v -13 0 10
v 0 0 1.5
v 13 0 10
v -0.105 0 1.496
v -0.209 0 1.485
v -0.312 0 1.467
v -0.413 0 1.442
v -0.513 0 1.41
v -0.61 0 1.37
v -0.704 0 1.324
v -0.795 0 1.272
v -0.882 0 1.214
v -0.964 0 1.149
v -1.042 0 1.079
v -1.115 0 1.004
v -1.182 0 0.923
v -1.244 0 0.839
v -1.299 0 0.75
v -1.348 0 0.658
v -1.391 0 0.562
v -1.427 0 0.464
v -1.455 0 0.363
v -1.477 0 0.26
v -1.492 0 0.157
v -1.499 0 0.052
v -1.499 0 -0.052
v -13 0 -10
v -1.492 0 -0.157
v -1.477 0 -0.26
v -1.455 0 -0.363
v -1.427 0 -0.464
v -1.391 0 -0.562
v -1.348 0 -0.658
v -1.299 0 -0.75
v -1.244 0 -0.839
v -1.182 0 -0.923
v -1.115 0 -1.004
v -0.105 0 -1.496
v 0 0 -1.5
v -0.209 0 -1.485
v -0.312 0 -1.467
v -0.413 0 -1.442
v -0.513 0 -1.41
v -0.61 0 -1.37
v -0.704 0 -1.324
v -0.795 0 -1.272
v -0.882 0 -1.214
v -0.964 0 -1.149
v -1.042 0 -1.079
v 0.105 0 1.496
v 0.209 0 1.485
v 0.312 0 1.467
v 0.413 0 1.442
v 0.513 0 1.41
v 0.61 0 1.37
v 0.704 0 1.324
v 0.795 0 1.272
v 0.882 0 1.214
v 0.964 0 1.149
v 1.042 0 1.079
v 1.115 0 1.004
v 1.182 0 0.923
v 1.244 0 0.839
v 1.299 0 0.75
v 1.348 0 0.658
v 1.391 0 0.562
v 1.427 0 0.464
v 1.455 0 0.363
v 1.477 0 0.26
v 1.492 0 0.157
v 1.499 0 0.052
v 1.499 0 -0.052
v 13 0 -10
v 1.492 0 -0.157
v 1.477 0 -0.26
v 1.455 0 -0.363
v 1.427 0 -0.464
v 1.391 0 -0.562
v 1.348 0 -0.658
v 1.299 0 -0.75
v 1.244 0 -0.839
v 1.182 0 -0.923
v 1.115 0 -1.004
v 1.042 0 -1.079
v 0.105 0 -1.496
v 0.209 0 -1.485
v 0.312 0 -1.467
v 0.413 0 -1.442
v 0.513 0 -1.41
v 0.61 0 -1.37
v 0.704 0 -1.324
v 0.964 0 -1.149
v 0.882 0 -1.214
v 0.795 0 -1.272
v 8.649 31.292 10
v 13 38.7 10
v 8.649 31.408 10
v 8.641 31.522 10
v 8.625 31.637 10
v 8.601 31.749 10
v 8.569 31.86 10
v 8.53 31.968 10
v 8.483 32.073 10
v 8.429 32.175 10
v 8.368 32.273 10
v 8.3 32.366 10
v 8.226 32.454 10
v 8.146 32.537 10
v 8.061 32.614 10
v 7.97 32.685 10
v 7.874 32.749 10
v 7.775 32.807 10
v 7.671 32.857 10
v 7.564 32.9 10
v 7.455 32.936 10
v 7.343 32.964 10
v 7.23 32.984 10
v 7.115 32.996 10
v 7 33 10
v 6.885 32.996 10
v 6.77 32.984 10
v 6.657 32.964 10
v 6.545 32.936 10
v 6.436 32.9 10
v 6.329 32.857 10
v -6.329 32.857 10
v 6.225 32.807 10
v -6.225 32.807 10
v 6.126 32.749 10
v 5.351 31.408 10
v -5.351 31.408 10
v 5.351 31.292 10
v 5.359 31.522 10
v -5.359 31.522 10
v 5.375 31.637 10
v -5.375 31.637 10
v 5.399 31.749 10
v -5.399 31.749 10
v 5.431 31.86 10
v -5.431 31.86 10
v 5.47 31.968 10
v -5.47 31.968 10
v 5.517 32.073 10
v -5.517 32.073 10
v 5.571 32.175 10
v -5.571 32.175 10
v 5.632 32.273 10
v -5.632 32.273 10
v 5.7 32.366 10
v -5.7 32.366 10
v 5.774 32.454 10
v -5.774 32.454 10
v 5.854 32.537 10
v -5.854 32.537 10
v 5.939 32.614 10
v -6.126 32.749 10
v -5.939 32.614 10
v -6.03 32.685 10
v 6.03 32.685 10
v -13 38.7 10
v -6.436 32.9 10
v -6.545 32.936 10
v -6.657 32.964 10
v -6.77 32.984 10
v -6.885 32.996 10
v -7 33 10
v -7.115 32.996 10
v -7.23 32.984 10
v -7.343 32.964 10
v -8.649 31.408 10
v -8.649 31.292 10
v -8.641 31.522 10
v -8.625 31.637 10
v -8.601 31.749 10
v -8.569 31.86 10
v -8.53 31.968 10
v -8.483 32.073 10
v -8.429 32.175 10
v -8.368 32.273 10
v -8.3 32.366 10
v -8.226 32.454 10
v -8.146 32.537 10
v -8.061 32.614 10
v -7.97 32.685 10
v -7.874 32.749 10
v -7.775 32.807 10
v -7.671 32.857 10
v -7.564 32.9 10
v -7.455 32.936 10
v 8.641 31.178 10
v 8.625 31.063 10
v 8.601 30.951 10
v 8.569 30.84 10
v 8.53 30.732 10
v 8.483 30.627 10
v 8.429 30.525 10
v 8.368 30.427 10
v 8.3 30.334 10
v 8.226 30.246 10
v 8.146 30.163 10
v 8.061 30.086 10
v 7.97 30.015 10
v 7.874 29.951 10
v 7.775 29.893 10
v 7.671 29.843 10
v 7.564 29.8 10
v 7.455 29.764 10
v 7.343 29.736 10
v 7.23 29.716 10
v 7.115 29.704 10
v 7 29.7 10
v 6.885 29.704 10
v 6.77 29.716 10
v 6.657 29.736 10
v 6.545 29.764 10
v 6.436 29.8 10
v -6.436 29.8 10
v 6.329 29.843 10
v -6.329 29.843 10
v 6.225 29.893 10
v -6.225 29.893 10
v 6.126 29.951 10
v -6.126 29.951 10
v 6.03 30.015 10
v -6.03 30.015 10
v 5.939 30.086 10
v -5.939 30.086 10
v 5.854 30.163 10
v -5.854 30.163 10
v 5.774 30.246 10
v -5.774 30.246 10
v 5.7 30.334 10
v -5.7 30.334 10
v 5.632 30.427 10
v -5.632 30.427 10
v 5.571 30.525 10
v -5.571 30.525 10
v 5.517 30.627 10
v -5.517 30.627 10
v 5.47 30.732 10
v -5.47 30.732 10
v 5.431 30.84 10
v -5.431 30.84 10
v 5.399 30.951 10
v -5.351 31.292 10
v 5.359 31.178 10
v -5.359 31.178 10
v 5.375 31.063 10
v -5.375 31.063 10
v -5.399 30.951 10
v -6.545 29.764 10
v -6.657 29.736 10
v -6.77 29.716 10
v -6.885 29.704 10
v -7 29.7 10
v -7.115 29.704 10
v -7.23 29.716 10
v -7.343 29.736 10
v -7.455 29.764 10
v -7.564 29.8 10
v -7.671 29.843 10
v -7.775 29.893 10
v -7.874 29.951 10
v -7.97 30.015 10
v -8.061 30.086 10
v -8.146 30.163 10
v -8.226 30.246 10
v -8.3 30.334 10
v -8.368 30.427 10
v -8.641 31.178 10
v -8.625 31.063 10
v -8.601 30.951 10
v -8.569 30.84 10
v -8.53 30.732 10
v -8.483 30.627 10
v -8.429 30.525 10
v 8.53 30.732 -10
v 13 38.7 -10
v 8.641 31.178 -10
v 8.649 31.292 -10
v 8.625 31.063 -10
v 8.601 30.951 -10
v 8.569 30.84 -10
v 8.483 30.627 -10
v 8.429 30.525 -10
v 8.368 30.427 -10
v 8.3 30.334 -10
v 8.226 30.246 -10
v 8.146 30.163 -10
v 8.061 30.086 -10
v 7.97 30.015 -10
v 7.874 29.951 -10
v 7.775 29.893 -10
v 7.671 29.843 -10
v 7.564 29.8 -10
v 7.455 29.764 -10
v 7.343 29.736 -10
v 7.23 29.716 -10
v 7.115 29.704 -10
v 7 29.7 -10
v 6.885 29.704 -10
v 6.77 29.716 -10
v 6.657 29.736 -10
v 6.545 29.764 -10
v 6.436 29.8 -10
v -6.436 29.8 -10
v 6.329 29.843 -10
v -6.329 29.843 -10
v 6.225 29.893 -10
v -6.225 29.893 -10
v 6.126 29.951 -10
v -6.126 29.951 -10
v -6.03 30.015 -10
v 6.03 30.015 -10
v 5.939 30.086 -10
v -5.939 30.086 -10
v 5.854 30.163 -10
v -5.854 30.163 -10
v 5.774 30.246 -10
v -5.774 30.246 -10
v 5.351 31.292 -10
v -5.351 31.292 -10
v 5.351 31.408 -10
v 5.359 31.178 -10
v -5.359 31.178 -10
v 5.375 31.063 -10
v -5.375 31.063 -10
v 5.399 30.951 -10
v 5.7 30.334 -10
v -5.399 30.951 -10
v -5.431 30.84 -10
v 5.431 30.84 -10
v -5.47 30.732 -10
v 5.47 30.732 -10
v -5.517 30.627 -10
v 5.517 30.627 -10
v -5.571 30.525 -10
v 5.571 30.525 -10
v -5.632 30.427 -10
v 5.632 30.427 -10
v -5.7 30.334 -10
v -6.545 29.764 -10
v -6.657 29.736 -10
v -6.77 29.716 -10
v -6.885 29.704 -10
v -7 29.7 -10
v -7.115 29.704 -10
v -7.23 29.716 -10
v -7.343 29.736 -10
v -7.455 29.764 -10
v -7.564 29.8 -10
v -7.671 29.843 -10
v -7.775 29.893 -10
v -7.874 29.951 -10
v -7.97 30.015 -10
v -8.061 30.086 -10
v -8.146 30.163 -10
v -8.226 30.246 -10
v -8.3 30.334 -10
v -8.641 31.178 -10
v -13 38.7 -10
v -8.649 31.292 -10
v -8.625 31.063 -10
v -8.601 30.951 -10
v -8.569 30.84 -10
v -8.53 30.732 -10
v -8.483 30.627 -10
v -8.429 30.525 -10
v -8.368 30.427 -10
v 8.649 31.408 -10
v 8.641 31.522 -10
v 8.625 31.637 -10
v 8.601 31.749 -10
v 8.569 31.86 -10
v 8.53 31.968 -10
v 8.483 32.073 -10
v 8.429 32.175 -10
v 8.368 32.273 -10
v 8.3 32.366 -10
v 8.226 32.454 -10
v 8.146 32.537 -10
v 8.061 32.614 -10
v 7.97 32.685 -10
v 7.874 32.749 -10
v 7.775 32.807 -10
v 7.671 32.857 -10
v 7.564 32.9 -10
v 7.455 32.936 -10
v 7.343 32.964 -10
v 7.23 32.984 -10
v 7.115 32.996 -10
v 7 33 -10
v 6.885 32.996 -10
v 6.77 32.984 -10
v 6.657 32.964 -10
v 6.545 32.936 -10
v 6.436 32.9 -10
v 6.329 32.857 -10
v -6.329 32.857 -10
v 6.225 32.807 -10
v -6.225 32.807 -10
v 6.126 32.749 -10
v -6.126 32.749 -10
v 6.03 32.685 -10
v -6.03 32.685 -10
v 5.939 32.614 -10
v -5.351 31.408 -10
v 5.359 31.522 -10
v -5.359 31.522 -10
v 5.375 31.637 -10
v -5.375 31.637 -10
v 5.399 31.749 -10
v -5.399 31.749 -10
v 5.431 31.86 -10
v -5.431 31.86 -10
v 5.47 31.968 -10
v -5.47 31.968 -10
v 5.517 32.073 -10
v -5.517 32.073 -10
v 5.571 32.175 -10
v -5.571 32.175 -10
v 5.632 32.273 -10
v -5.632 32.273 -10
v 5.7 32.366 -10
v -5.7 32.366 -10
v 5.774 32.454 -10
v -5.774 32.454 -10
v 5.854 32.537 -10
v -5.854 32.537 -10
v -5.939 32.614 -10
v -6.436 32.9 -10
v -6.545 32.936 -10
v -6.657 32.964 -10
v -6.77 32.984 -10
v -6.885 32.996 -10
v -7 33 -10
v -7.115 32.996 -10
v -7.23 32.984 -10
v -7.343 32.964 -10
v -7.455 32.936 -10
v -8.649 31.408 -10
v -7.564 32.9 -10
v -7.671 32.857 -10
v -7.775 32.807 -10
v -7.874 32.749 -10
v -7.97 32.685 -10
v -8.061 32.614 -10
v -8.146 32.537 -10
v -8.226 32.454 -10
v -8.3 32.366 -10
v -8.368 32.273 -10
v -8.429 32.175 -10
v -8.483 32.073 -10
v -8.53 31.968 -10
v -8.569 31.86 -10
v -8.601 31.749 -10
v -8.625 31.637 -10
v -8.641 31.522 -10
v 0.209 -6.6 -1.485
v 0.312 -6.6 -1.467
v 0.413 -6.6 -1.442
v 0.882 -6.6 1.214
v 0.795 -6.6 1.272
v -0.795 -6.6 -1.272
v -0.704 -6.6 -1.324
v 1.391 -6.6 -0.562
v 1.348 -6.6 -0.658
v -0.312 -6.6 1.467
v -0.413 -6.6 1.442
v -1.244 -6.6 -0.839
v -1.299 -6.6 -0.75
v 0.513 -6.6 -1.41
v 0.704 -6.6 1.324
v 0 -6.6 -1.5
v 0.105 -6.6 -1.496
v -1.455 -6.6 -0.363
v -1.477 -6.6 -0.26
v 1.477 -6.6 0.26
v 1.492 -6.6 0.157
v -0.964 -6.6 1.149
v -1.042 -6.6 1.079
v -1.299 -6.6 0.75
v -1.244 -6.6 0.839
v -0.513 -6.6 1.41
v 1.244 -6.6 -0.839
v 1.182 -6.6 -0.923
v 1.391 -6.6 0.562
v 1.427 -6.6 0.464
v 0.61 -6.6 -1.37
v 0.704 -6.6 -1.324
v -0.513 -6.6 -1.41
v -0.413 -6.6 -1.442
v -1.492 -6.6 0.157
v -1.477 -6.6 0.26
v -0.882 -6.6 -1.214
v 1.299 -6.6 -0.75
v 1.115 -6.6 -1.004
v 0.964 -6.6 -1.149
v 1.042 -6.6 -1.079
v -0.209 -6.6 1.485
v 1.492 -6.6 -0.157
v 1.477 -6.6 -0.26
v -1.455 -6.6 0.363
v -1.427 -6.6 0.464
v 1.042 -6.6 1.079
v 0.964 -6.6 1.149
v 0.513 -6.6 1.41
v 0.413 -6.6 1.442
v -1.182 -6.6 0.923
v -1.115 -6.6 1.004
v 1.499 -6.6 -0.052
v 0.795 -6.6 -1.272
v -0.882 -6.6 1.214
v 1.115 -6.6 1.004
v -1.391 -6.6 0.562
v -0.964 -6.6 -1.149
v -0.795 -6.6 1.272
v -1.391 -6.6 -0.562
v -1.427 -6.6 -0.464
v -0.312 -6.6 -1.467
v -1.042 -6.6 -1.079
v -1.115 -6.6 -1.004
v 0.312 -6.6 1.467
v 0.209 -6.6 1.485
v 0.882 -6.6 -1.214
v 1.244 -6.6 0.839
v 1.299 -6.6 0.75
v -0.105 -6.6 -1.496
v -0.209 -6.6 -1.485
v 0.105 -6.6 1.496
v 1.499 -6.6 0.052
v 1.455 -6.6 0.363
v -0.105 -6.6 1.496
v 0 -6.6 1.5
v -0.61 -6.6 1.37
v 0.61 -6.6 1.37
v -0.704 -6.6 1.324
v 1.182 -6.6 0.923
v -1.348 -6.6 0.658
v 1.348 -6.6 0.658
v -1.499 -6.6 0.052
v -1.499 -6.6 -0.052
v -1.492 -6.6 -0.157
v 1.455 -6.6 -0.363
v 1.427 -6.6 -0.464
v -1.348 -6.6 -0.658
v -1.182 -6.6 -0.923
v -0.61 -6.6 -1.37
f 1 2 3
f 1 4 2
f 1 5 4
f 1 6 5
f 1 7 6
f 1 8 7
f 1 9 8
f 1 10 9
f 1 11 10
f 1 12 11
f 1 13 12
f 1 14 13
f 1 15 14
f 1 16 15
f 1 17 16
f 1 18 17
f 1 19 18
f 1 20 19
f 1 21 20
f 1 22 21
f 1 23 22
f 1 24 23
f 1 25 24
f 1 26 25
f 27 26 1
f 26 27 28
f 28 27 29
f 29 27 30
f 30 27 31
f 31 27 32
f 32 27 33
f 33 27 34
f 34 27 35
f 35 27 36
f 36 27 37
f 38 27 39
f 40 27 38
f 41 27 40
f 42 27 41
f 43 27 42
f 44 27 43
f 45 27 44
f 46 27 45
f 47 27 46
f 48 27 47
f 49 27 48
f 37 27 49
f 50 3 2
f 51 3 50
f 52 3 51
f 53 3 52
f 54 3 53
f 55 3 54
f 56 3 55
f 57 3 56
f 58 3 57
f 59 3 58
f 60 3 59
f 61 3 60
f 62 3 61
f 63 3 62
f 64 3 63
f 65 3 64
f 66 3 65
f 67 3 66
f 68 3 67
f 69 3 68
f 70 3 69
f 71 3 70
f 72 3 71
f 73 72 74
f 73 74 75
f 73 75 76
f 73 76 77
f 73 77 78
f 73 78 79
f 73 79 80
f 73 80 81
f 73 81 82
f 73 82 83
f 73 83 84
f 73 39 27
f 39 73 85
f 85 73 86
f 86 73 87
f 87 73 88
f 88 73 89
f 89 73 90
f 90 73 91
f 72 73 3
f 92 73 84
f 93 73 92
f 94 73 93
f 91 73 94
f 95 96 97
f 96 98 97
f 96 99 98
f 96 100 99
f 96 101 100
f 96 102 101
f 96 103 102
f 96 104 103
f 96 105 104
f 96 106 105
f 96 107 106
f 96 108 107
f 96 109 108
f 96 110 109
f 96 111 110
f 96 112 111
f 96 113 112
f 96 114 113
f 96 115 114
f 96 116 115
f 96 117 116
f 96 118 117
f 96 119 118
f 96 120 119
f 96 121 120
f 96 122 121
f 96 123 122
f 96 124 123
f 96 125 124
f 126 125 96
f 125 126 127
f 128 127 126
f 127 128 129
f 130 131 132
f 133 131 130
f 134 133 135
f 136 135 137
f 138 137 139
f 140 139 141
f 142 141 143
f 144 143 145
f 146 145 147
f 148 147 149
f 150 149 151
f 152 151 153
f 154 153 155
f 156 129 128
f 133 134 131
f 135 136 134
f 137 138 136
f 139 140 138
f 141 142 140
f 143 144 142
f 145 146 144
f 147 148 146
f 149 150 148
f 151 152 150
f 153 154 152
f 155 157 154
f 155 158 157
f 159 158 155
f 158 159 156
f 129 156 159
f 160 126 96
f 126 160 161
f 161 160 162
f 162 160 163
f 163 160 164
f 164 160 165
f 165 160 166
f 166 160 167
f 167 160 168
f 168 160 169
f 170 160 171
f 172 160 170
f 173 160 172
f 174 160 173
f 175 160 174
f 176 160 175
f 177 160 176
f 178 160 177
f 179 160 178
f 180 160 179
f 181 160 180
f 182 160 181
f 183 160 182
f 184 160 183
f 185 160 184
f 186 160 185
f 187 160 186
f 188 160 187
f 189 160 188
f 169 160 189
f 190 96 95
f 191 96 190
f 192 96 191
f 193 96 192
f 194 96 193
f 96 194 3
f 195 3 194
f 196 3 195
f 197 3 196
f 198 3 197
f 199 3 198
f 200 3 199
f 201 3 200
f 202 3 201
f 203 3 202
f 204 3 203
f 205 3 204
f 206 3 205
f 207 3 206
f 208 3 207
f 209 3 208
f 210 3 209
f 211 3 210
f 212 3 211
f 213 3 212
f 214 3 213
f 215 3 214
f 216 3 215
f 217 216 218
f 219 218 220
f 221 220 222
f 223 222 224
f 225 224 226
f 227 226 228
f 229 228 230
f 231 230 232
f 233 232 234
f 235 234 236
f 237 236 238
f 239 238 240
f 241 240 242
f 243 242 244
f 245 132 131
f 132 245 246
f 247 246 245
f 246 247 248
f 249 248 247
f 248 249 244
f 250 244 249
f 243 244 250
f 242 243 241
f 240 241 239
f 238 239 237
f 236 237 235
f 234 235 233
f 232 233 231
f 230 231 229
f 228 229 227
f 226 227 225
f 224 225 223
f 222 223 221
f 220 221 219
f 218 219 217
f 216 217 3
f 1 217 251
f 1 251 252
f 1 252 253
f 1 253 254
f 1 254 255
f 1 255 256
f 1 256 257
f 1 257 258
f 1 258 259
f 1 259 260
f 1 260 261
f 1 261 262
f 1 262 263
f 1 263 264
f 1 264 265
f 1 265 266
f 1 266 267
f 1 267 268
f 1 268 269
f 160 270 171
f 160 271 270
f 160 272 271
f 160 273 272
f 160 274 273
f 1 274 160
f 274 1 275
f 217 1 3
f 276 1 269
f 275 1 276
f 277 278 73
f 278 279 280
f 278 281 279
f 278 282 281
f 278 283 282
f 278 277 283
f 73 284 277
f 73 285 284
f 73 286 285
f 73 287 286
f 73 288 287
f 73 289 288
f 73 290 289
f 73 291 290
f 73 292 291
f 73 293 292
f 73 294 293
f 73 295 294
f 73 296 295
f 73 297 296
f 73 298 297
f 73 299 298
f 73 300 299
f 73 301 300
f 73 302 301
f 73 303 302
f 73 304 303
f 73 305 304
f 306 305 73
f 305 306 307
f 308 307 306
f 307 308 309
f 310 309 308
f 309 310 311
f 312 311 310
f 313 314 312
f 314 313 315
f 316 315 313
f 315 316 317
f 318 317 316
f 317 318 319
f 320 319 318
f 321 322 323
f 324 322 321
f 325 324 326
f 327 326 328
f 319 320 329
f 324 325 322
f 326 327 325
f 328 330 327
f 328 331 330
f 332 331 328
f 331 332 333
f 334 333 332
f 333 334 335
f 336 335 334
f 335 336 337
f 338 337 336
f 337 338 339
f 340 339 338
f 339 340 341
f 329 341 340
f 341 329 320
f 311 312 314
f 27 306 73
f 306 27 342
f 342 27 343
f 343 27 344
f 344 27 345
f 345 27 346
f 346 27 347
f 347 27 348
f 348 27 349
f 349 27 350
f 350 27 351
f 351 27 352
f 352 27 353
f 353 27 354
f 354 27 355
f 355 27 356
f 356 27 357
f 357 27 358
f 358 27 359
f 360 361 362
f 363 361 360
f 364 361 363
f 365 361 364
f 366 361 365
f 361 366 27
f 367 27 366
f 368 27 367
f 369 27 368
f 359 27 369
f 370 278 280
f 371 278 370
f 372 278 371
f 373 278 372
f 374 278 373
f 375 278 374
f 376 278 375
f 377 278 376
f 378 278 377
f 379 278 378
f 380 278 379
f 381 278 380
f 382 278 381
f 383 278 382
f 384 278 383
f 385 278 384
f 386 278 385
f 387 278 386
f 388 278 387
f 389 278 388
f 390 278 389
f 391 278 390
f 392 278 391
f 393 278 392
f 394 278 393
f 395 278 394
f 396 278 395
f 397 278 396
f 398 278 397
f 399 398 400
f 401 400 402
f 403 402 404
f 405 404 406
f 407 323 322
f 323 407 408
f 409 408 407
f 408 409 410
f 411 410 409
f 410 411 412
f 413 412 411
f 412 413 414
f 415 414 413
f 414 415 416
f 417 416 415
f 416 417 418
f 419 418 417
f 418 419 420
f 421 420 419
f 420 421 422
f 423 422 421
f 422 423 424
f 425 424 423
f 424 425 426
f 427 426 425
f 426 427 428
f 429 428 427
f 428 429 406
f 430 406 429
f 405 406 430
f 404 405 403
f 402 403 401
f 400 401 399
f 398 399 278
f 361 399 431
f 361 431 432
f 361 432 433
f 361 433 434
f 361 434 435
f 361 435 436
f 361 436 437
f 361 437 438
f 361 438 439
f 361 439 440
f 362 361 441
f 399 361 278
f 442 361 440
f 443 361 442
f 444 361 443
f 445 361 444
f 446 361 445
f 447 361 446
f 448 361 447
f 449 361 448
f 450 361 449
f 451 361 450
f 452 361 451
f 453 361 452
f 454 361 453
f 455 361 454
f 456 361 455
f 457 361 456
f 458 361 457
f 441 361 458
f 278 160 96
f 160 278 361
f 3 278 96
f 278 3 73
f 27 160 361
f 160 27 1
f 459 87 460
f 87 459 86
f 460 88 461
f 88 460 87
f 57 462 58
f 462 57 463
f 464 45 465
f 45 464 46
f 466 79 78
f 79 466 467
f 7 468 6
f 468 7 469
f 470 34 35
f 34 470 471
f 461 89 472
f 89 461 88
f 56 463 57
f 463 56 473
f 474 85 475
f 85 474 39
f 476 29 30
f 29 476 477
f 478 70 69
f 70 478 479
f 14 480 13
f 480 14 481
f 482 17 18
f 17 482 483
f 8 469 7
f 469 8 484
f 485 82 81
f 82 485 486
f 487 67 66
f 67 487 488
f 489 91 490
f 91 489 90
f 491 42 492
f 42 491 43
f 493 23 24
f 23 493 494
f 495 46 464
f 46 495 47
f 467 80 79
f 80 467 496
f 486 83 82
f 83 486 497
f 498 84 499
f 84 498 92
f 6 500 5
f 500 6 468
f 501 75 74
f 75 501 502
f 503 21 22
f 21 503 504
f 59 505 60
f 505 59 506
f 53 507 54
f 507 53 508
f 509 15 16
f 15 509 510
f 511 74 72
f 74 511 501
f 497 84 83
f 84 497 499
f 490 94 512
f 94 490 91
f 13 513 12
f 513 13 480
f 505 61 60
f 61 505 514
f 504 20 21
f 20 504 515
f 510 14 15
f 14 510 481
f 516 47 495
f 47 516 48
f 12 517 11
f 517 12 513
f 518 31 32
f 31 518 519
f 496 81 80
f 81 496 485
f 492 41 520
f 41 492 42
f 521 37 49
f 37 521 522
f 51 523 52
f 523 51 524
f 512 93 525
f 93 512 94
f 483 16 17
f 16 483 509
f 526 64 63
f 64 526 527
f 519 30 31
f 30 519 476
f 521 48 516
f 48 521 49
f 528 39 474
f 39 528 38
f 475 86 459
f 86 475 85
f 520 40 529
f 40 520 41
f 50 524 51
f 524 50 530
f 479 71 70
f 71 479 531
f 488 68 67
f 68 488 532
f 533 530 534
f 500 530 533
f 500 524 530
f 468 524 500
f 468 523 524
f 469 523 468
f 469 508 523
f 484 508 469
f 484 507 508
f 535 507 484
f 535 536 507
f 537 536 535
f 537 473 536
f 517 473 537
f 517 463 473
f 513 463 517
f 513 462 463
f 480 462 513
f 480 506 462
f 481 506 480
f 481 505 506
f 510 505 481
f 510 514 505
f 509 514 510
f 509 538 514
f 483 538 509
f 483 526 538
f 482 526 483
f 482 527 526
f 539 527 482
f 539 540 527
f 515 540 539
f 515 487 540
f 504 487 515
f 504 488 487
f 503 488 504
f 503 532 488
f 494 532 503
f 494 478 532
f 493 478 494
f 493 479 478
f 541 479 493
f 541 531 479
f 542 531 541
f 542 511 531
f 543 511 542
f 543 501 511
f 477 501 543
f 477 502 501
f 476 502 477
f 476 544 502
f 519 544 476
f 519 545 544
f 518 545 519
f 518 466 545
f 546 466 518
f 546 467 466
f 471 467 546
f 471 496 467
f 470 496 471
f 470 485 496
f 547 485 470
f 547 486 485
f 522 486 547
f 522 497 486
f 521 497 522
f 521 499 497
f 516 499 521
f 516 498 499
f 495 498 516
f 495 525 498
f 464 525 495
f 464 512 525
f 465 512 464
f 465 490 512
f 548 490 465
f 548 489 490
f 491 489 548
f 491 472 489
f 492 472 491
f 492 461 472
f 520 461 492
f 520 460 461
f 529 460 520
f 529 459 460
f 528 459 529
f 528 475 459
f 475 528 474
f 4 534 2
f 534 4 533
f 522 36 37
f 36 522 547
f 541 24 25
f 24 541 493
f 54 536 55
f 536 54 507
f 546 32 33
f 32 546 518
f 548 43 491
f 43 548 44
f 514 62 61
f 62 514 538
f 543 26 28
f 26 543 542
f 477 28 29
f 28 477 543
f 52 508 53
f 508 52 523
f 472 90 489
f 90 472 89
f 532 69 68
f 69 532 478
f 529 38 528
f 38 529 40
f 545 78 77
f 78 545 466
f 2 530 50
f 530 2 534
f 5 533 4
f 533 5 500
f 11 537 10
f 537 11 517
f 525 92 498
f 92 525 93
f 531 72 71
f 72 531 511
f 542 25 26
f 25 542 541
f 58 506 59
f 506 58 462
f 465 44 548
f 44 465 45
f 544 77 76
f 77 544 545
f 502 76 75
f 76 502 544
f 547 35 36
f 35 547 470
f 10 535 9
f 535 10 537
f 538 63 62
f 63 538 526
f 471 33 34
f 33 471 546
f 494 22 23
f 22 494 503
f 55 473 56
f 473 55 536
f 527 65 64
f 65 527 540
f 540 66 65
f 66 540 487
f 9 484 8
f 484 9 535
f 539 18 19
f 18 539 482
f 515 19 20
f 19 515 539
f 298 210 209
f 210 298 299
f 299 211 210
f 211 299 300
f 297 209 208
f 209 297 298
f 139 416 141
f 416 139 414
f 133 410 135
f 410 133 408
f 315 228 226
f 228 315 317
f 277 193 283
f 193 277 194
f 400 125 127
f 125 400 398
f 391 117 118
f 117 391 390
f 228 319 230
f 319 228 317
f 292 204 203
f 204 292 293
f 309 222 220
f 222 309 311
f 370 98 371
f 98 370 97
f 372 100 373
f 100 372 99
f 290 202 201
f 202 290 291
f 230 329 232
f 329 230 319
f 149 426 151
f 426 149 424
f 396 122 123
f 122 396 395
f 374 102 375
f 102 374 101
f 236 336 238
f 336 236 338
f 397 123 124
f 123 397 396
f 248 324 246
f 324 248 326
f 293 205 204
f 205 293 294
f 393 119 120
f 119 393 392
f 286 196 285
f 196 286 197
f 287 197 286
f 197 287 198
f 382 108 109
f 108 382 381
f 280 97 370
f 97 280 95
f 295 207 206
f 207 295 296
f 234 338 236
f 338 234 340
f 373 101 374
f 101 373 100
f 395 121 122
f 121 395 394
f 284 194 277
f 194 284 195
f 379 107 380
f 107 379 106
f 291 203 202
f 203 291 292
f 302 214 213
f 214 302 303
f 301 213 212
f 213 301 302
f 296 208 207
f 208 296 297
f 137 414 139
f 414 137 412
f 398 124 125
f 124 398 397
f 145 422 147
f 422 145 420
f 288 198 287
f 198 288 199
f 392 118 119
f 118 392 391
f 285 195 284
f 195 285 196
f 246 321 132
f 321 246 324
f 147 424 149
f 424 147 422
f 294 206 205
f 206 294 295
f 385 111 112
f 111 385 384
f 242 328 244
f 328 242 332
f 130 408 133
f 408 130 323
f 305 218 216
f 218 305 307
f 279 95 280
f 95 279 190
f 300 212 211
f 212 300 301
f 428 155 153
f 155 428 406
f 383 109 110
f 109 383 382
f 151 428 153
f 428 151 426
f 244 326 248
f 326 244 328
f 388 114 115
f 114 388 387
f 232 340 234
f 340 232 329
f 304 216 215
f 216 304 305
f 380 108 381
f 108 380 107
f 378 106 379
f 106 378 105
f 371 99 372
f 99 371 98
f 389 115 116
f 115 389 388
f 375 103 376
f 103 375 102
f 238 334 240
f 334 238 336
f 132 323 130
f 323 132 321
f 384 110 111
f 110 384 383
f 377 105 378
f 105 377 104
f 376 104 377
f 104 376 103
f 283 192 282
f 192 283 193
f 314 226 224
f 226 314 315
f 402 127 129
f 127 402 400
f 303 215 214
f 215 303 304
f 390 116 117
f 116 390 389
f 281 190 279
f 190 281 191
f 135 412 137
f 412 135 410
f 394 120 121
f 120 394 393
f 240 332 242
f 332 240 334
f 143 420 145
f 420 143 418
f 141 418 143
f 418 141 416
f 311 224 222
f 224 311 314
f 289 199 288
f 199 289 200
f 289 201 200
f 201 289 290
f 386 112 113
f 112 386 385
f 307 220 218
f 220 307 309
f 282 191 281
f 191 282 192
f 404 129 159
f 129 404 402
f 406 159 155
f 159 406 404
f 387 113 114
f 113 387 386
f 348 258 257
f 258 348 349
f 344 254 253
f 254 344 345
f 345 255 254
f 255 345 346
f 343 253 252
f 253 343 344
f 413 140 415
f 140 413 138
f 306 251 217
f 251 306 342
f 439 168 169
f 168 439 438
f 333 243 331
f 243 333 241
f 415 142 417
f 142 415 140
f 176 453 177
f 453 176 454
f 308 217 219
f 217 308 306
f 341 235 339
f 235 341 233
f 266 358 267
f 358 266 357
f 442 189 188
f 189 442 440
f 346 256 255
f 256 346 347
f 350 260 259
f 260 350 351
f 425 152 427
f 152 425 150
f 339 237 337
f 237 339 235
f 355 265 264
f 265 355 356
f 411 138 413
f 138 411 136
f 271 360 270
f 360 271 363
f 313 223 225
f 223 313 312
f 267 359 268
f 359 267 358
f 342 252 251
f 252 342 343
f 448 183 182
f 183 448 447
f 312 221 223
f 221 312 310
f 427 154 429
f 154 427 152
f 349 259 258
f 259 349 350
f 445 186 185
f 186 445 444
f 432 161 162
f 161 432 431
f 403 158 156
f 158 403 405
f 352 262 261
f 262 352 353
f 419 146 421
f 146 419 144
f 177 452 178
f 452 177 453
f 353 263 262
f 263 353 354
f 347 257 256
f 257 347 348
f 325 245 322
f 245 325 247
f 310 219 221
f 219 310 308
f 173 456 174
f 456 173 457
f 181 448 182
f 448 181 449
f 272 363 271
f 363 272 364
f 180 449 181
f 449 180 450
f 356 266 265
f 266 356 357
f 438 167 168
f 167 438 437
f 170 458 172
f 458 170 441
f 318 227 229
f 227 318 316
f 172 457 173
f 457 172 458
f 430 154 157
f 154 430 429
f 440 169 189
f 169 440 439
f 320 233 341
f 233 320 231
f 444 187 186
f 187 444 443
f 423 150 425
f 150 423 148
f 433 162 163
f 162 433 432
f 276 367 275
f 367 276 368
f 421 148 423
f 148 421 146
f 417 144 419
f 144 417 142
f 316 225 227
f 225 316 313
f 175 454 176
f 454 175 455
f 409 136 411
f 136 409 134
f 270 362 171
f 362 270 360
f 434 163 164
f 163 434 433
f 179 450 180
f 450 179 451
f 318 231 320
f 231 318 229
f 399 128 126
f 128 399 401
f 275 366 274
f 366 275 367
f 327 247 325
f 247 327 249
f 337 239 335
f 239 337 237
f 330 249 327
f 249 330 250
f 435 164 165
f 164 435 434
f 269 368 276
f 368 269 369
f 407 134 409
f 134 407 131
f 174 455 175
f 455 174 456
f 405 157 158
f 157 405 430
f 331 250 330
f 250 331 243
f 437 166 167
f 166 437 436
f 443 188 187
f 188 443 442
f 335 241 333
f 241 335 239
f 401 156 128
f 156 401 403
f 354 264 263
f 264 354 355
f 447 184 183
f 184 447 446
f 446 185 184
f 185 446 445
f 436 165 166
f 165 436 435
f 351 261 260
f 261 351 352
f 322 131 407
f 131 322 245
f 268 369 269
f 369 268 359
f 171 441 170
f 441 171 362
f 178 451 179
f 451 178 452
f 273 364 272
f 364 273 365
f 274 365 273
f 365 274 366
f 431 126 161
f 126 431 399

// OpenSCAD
$fn = 90;

module kicker_holes(
    hole_d = 3.3,
    hole_height = 200,
    body_width = 38.7,
    hole_x_offsets = [0, -22],
    hole_y_offsets = [7, -7],
    hole_x_shift = 12
) {
    rotate([0, 0, -90])
        translate([-body_width / 2, 0, 0])
            for (y = hole_y_offsets)
                for (x = hole_x_offsets) {
                    translate([x + body_width / 2 - hole_x_shift, y, 0])
                        cylinder(d = hole_d, h = hole_height, center = true);
                }
}

module kicker(
    body_size = [38.7, 26, 20],
    pin_d = 3,
    pin_h = 19.6 - 13,
    hole_d = 3.3,
    hole_height = 200,
    hole_x_offsets = [0, -22],
    hole_y_offsets = [7, -7],
    hole_x_shift = 12
) {
    rotate([0, 0, -90])
        translate([-body_size[0] / 2, 0, 0])
            difference() {
                union() {
                    cube(body_size, center = true);
                    translate([body_size[0] / 2, 0, 0])
                        rotate([0, 90, 0])
                            cylinder(h = pin_h, d = pin_d);
                }
                rotate([0, 0, 90])
                    kicker_holes(
                        hole_d = hole_d,
                        hole_height = hole_height,
                        body_width = body_size[0],
                        hole_x_offsets = hole_x_offsets,
                        hole_y_offsets = hole_y_offsets,
                        hole_x_shift = hole_x_shift
                    );
            }
}

module kicker_cutout(
    cutout_offset = [0, -76.5, 23.15],
    cutout_size = [55, 12, 20 - 0.4],
    hole_d = 3.3,
    hole_h = 30,
    slot_size = [5.5, 3.1, 15],
    slot_offset = [0, 2, 8],
    hex_d = 6.3,
    hex_h = 3.1,
    hex_offset = [0, 2, 0],
    hex_rotation = [90, 30, 0],
    relief_offset = [70, 20, 0],
    relief_scale = [3, 1, 1],
    relief_d = 50,
    relief_h = 100
) {
    translate(cutout_offset)
        difference() {
            cube(cutout_size, center = true);
            rotate([90, 0, 0])
                cylinder(d = hole_d, h = hole_h, center = true);
            translate(slot_offset)
                cube(slot_size, center = true);
            translate(hex_offset)
                rotate(hex_rotation)
                    cylinder(h = hex_h, d = hex_d, center = true, $fn = 6);
            for (dir = [1, -1]) {
                translate([dir * relief_offset[0], relief_offset[1], relief_offset[2]])
                    scale(relief_scale)
                        cylinder(h = relief_h, d = relief_d, center = true);
            }
        }
}

kicker();
